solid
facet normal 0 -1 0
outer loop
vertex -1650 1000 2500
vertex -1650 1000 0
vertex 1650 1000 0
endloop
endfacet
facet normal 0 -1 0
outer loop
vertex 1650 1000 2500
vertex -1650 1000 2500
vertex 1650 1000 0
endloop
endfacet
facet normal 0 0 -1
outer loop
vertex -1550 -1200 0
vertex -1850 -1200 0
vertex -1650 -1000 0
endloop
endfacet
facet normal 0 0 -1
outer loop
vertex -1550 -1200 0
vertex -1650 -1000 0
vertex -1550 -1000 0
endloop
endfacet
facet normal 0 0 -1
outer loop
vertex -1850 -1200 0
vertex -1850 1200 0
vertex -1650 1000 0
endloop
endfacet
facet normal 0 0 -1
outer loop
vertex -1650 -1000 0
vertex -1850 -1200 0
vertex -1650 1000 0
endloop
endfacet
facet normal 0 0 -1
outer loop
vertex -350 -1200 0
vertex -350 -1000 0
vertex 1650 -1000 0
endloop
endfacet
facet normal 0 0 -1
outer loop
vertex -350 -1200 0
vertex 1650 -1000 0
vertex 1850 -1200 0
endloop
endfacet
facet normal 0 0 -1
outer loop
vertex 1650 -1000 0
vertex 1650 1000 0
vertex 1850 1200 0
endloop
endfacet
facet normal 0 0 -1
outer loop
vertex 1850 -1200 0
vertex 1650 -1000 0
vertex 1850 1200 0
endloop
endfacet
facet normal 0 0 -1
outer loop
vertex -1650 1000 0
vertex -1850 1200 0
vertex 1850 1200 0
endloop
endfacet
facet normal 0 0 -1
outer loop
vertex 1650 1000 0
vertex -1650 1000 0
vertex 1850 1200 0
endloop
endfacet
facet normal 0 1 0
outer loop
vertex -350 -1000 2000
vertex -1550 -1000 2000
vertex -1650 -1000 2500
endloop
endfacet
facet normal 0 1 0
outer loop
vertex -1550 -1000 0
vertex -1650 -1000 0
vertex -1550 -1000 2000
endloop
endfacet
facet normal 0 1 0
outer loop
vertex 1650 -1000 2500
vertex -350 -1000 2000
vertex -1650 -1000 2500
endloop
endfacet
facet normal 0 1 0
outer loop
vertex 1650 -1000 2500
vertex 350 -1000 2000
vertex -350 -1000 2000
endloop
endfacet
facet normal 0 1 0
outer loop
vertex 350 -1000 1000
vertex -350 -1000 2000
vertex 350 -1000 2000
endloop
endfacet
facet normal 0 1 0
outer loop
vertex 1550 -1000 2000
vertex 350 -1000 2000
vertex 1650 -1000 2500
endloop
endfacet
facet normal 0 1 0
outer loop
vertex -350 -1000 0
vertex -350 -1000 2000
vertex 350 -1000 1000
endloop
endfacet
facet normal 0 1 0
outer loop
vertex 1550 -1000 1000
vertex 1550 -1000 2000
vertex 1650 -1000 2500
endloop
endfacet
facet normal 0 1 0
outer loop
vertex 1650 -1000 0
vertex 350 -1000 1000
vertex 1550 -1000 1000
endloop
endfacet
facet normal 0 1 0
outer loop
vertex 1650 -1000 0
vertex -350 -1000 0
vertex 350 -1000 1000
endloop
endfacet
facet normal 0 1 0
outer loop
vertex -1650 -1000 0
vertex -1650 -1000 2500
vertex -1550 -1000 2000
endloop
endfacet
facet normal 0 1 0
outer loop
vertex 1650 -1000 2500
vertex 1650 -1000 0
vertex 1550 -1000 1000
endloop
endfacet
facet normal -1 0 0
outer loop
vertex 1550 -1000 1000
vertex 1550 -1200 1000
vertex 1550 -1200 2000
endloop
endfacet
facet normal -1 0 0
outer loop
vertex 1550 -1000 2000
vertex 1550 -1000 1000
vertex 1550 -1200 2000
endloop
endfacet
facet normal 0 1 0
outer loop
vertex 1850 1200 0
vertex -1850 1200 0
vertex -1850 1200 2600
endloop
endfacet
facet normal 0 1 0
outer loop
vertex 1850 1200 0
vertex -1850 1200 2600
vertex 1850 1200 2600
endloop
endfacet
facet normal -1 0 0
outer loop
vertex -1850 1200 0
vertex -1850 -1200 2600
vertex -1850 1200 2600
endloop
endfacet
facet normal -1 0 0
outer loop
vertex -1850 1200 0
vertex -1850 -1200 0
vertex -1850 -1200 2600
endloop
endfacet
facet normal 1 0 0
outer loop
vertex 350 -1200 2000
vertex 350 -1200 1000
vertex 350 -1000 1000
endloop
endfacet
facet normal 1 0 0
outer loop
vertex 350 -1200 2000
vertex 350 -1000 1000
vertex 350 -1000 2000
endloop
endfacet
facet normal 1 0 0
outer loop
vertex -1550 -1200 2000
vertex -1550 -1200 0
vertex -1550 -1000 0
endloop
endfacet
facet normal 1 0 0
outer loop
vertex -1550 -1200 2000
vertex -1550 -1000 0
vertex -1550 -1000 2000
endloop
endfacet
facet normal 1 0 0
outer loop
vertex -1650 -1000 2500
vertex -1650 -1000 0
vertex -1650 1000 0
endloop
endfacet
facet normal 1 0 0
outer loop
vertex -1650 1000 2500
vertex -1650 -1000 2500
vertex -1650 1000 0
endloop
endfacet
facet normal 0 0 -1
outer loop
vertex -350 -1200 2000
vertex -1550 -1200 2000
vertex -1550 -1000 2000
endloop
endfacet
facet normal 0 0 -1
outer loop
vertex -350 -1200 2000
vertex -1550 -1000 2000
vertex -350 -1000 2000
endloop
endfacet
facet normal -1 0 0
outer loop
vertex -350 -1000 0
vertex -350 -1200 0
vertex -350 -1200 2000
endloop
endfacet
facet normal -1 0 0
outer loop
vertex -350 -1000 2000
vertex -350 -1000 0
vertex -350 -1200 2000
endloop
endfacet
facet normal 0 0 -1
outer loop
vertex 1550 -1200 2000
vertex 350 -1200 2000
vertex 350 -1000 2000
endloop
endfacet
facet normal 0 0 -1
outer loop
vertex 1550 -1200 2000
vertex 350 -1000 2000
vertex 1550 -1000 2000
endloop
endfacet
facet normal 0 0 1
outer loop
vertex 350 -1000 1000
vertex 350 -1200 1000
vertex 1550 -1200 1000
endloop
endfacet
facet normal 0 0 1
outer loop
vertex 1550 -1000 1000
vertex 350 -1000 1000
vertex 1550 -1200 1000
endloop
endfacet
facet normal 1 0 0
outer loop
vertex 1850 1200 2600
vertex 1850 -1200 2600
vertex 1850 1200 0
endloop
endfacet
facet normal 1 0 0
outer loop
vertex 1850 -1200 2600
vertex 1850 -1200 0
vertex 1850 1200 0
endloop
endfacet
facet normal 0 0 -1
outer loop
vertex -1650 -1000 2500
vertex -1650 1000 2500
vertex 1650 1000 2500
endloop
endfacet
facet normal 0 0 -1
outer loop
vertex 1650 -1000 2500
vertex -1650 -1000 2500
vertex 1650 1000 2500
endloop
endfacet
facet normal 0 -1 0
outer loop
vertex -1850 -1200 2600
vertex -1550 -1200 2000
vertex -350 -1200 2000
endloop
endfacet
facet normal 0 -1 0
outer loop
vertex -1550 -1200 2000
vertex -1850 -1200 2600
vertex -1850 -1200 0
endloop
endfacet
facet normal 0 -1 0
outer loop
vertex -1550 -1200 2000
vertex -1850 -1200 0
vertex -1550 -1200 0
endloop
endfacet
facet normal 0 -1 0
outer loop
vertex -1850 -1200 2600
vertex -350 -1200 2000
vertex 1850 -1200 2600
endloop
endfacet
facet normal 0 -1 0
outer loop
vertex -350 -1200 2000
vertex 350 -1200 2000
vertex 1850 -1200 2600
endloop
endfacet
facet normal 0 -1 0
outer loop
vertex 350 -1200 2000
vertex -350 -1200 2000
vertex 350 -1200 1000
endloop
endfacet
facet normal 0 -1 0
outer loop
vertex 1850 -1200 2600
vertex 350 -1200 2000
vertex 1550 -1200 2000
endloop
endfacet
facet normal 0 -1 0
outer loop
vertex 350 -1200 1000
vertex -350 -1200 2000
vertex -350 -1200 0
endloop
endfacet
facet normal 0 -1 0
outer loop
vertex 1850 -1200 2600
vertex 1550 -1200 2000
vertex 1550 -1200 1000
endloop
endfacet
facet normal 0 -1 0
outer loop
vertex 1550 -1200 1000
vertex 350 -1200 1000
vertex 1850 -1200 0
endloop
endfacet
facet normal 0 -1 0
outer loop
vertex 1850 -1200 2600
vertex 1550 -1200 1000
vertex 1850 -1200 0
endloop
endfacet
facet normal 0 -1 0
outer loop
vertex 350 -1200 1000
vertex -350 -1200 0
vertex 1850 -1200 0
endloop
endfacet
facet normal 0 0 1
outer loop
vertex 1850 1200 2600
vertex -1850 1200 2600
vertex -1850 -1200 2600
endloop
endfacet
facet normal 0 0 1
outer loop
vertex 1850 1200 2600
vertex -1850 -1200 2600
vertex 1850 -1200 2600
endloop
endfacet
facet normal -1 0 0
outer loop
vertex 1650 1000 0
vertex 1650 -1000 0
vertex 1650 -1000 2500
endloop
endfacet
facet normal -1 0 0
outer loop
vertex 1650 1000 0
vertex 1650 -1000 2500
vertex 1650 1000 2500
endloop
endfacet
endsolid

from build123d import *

# Parameters (mm, degrees)
F0_W     = 3700
F0_H     = 2400
F0_W_2   = 3300
F0_H_2   = 2000
F1_DEPTH = 2500
F2_W     = 3700
F2_H     = 2400
F3_DEPTH = 100
F4_W     = 1200
F4_H     = 2000
F4_H_2   = 1000
F5_DEPTH = 200


with BuildPart() as f1:
    # F0 (on Top) → F1 (new body)
    with BuildSketch(Plane.XY):
        Rectangle(F0_W, F0_H)
        Rectangle(F0_W_2, F0_H_2, mode=Mode.SUBTRACT)
    extrude(amount=F1_DEPTH)

    # F2 (on face) → F3 (join)
    with BuildSketch(Plane.XY.offset(2500)):
        Rectangle(F2_W, F2_H)
    extrude(amount=F3_DEPTH)

    # F4 (on face) → F5 (cut, through all)
    with BuildSketch(Plane.XZ.offset(1200)):
        with Locations((-950, 1000)):
            Rectangle(F4_W, F4_H)
        with Locations((950, 1500)):
            Rectangle(F4_W, F4_H_2)
    extrude(amount=-F5_DEPTH, mode=Mode.SUBTRACT)


solid = f1.part
